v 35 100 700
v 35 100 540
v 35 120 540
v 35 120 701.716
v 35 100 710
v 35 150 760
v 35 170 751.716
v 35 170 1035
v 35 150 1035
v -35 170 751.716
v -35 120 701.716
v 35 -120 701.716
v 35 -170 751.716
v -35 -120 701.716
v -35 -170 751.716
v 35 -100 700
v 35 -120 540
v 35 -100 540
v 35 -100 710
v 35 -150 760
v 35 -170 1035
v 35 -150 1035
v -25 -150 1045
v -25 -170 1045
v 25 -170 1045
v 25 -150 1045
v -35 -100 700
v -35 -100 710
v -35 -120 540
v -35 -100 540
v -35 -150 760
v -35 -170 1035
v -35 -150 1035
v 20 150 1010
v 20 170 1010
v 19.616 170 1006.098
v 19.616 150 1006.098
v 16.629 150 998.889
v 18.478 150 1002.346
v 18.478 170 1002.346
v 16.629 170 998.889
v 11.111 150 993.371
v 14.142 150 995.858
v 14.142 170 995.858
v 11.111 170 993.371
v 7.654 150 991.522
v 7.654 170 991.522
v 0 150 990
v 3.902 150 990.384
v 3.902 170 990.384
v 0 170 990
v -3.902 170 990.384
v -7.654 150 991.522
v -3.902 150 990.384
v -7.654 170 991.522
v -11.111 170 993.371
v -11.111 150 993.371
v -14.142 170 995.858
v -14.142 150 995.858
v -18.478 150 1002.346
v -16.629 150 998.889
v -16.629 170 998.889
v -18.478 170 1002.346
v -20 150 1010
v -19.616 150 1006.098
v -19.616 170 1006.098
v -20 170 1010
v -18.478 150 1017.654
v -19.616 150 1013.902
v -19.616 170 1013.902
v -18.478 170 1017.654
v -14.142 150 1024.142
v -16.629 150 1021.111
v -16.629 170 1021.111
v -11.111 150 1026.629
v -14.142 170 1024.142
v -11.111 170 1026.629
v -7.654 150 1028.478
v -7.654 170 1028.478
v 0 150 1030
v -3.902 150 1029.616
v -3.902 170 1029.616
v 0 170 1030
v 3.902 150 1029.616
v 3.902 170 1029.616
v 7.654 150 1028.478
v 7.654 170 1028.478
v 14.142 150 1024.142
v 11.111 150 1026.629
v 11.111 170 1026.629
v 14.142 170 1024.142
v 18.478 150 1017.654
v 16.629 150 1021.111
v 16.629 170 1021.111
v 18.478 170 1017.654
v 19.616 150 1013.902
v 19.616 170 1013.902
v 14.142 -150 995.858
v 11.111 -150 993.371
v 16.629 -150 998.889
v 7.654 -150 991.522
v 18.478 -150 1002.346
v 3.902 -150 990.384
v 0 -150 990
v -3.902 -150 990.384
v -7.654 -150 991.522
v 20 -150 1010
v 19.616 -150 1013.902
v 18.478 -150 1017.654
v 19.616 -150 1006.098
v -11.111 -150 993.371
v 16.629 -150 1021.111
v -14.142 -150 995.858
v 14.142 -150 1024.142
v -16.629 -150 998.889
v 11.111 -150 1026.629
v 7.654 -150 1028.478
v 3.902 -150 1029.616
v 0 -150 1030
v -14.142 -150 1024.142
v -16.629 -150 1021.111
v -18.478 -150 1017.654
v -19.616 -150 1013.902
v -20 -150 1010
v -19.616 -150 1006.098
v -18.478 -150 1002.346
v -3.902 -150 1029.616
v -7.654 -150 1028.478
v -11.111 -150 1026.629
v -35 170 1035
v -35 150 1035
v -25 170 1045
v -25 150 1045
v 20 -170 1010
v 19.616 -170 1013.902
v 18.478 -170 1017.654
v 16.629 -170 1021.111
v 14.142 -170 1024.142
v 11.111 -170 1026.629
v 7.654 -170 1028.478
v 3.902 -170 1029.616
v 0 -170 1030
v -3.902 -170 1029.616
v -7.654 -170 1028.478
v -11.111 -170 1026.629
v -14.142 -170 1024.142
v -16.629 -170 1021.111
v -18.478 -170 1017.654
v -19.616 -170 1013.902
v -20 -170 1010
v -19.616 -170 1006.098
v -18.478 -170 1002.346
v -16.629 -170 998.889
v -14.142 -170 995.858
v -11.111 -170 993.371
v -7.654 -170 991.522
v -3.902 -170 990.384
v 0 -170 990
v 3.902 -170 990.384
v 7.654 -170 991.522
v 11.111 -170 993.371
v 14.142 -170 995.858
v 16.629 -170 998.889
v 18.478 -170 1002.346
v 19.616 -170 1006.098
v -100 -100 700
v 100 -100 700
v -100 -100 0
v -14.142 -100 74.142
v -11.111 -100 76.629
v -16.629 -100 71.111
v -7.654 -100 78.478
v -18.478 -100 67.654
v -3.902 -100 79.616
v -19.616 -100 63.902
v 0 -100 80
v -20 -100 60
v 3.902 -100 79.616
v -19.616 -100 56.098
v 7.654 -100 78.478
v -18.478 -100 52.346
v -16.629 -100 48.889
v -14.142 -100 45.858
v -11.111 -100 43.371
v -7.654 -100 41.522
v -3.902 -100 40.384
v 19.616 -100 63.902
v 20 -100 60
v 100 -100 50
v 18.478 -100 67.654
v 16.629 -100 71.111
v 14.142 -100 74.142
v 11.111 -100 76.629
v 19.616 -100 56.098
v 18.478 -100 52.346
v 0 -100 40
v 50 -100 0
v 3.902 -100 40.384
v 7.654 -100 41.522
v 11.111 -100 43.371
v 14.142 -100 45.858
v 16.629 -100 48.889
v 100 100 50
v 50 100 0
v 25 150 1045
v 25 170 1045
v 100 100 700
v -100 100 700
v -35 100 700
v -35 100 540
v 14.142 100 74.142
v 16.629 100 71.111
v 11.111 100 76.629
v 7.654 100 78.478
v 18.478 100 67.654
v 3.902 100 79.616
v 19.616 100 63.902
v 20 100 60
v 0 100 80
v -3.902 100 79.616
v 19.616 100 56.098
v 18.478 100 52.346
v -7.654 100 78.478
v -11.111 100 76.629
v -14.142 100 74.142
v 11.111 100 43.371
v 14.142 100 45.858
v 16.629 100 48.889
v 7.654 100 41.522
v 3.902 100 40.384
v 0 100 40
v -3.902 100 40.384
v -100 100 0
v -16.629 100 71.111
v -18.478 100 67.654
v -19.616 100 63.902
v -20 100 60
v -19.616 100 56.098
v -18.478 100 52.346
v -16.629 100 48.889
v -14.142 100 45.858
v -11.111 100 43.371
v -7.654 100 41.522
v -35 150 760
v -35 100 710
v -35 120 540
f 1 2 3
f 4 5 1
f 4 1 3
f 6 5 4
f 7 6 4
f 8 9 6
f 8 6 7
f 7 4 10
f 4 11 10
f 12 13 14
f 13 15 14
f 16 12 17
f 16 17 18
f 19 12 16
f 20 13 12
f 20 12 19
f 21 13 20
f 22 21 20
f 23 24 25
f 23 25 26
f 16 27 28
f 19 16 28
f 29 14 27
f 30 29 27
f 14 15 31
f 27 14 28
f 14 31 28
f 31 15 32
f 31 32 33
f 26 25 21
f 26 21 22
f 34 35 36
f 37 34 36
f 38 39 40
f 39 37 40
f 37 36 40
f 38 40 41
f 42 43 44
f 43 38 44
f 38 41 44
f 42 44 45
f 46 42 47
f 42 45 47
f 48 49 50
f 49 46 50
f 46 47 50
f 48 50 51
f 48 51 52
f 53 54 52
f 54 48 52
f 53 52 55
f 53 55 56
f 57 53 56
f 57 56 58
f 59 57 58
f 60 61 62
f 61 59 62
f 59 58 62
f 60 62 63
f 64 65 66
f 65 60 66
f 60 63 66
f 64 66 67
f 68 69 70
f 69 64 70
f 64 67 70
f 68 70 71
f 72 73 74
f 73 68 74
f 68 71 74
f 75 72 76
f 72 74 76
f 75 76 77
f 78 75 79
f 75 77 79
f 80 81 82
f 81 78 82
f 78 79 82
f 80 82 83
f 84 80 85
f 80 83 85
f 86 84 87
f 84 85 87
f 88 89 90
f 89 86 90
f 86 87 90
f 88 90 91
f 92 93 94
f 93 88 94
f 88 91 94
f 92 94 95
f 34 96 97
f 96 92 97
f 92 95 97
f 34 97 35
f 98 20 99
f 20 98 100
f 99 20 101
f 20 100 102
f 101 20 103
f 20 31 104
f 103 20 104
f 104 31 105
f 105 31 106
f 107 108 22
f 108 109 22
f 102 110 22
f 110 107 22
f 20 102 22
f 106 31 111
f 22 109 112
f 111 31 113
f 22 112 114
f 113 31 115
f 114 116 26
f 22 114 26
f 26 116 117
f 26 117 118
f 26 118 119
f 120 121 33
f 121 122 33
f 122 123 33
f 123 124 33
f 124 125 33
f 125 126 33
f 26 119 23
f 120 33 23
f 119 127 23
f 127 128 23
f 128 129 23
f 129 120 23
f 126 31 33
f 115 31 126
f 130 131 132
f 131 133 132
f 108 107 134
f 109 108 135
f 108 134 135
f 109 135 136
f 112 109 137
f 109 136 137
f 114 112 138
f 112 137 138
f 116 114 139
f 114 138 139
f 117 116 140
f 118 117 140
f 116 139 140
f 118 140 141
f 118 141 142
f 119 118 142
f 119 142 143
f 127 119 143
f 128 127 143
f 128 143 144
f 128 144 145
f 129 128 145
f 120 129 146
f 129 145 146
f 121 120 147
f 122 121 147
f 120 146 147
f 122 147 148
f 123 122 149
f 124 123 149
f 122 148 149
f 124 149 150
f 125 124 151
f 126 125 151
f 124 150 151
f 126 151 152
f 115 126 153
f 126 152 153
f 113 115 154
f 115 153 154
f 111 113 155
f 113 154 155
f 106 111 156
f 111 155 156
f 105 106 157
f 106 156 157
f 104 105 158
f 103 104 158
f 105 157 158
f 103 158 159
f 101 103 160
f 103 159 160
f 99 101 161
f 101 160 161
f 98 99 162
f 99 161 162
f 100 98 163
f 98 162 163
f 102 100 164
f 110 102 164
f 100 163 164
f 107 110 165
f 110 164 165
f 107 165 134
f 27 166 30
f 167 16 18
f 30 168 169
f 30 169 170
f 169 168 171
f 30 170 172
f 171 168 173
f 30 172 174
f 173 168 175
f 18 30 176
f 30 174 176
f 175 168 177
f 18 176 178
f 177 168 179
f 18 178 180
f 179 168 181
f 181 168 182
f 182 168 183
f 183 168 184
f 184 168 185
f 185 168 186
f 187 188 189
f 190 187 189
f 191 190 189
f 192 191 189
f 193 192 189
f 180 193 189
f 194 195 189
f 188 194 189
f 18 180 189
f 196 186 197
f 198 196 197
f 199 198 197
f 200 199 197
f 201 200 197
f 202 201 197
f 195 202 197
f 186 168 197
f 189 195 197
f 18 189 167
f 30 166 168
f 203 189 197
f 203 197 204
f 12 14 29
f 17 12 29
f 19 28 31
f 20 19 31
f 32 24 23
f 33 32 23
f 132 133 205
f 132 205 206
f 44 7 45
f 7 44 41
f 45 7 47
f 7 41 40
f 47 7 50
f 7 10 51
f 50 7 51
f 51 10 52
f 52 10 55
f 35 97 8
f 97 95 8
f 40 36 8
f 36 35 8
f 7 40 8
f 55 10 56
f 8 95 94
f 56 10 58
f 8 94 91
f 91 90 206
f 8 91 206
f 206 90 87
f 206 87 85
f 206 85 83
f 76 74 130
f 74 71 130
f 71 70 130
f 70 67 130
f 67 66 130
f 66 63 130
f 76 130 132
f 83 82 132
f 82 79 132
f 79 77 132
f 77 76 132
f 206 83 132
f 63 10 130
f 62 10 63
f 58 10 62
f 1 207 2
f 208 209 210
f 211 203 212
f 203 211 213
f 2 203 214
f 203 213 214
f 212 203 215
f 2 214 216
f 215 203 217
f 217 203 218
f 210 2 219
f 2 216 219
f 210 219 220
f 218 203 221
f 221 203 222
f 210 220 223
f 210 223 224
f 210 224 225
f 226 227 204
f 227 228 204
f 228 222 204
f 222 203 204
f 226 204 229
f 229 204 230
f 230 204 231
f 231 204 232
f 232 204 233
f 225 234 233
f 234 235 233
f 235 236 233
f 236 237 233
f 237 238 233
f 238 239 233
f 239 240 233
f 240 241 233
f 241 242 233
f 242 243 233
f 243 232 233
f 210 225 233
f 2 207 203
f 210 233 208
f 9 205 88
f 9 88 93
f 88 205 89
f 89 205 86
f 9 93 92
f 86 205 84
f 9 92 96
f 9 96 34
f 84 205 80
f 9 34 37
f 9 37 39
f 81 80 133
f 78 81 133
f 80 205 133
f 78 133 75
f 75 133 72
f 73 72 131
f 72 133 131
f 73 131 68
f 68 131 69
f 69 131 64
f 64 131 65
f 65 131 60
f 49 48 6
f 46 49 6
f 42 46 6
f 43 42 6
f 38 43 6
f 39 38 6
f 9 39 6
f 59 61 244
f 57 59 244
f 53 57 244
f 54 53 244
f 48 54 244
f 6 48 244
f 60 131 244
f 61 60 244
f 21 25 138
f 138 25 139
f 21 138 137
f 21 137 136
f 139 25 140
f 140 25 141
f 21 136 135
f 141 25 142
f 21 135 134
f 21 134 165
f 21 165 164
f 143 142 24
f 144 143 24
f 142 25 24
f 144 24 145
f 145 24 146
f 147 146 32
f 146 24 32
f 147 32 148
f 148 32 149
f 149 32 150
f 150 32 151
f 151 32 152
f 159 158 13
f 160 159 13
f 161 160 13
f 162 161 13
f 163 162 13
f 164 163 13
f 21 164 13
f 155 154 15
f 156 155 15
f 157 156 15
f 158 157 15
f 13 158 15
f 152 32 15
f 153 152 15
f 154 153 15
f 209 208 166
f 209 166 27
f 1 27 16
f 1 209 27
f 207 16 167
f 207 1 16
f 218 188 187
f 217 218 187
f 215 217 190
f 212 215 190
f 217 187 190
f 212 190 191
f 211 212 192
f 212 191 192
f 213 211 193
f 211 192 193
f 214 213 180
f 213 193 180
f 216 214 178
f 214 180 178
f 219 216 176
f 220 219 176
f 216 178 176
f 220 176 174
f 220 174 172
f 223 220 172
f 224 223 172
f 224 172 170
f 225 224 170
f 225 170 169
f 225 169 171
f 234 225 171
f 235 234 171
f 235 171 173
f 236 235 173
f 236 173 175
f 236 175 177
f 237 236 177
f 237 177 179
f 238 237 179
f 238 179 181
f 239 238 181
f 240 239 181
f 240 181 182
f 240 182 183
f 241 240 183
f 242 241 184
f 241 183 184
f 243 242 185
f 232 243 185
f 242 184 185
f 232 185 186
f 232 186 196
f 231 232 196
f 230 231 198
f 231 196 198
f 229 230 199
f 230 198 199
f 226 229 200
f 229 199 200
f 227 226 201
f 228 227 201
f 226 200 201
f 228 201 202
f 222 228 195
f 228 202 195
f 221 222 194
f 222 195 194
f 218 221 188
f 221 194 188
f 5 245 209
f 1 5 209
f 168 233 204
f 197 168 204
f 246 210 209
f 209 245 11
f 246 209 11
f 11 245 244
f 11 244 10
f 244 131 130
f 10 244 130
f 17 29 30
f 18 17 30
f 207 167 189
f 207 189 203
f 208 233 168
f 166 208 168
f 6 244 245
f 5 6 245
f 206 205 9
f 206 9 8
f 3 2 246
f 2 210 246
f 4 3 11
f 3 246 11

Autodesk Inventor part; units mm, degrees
ref_plane "YZ Plane" through (0, 0, 0) normal (1, 0, 0) x (0, 1, 0)
ref_plane "XZ Plane" through (0, 0, 0) normal (0, 1, 0) x (-1, 0, 0)
ref_plane "XY Plane" through (0, 0, 0) normal (0, 0, 1) x (1, 0, 0)
sketch "Náčrt1" plane through (0, 0, 0) normal (0, 0, 1) x (1, 0, 0)
  line L0 (-100, -100) -> (100, -100)
  line L1 (100, -100) -> (100, 100)
  line L2 (100, 100) -> (-100, 100)
  line L3 (-100, 100) -> (-100, -100)
  line L4 (-100, -100) -> (100, 100) construction
  line L5 (100, -100) -> (-100, 100) construction
  point P0 (0, 0)
  dimension "d0" = 200
extrude "Vysunutí1" add sketch "Náčrt1" along normal blind 700
sketch "Náčrt2" plane through (0, 0, 0) normal (1, 0, 0) x (0, 1, 0)
  line L0 (-100, 0) -> (-100, 700) projected
  line L1 (-150, 760) -> (-150, 1045)
  line L2 (-120, 681.7157) -> (-120, 540)
  line L3 (-100, 700) -> (100, 700) projected
  line L4 (0, 700) -> (0, 773.8359) construction
  line L5 (-100, 0) -> (100, 0) projected
  line L6 (-100, 540) -> (-100, 710)
  line L7 (-100, 710) -> (-150, 760)
  line L8 (-170, 1045) -> (-170, 751.7157)
  line L9 (-170, 751.7157) -> (-120, 701.7157)
  line L10 (-120, 701.7157) -> (-120, 540)
  line L11 (-170, 1045) -> (-150, 1045)
  line L12 (-120, 540) -> (-100, 540)
  line L13 (-170, 1010) -> (-150, 1010) construction
  point P0 (0, 0)
  dimension "d5" = 150
  dimension "d22" = 135
  dimension "d24" = 20
  dimension "d26" = 10
  dimension "d35" = 345
  dimension "d36" = 35
extrude "Vysunutí2" add sketch "Náčrt2" along normal mid plane 70
sketch "Náčrt3" plane through (-30, -170, 712.0978) normal (0, -1, 0) x (1, 0, 0)
  line L0 (-5, 332.9022) -> (65, 332.9022) projected
  line L1 (30, 332.9022) -> (30, 269.5637) construction
  circle A0 centre (30, 297.9022) radius 20
  point P0 (30, -712.0978)
  dimension "d11" = 40
  dimension "d12" = 35
  dimension "d25" = 70
extrude "Vysunutí3" cut sketch "Náčrt3" against normal blind 60
chamfer "Zkosení1" distance 10 angle 45 2 edges at (35, -160, 1045) (-35, -160, 1045)
mirror "Zrcadlit1" about plane through (0, 0, 0) normal (0, 1, 0)
sketch "Náčrt4" plane through (-100, -100, 0) normal (0, -1, 0) x (1, 0, 0)
  circle A0 centre (100, 1010) radius 20 projected
  circle A1 centre (100, 60) radius 20
  line L0 (0, 0) -> (200, 0) projected
  line L1 (100, 0) -> (100, 549.2134) construction
  dimension "d27" = 40
  dimension "d28" = 60
  dimension "d29" = 950
extrude "Vysunutí4" cut sketch "Náčrt4" against normal through all contours A1
chamfer "Zkosení2" distance 50 angle 45 1 edges at (100, 0, 0)
equation "\"d12\" = 0.5 * d25"
properties part number "B5-A1"
